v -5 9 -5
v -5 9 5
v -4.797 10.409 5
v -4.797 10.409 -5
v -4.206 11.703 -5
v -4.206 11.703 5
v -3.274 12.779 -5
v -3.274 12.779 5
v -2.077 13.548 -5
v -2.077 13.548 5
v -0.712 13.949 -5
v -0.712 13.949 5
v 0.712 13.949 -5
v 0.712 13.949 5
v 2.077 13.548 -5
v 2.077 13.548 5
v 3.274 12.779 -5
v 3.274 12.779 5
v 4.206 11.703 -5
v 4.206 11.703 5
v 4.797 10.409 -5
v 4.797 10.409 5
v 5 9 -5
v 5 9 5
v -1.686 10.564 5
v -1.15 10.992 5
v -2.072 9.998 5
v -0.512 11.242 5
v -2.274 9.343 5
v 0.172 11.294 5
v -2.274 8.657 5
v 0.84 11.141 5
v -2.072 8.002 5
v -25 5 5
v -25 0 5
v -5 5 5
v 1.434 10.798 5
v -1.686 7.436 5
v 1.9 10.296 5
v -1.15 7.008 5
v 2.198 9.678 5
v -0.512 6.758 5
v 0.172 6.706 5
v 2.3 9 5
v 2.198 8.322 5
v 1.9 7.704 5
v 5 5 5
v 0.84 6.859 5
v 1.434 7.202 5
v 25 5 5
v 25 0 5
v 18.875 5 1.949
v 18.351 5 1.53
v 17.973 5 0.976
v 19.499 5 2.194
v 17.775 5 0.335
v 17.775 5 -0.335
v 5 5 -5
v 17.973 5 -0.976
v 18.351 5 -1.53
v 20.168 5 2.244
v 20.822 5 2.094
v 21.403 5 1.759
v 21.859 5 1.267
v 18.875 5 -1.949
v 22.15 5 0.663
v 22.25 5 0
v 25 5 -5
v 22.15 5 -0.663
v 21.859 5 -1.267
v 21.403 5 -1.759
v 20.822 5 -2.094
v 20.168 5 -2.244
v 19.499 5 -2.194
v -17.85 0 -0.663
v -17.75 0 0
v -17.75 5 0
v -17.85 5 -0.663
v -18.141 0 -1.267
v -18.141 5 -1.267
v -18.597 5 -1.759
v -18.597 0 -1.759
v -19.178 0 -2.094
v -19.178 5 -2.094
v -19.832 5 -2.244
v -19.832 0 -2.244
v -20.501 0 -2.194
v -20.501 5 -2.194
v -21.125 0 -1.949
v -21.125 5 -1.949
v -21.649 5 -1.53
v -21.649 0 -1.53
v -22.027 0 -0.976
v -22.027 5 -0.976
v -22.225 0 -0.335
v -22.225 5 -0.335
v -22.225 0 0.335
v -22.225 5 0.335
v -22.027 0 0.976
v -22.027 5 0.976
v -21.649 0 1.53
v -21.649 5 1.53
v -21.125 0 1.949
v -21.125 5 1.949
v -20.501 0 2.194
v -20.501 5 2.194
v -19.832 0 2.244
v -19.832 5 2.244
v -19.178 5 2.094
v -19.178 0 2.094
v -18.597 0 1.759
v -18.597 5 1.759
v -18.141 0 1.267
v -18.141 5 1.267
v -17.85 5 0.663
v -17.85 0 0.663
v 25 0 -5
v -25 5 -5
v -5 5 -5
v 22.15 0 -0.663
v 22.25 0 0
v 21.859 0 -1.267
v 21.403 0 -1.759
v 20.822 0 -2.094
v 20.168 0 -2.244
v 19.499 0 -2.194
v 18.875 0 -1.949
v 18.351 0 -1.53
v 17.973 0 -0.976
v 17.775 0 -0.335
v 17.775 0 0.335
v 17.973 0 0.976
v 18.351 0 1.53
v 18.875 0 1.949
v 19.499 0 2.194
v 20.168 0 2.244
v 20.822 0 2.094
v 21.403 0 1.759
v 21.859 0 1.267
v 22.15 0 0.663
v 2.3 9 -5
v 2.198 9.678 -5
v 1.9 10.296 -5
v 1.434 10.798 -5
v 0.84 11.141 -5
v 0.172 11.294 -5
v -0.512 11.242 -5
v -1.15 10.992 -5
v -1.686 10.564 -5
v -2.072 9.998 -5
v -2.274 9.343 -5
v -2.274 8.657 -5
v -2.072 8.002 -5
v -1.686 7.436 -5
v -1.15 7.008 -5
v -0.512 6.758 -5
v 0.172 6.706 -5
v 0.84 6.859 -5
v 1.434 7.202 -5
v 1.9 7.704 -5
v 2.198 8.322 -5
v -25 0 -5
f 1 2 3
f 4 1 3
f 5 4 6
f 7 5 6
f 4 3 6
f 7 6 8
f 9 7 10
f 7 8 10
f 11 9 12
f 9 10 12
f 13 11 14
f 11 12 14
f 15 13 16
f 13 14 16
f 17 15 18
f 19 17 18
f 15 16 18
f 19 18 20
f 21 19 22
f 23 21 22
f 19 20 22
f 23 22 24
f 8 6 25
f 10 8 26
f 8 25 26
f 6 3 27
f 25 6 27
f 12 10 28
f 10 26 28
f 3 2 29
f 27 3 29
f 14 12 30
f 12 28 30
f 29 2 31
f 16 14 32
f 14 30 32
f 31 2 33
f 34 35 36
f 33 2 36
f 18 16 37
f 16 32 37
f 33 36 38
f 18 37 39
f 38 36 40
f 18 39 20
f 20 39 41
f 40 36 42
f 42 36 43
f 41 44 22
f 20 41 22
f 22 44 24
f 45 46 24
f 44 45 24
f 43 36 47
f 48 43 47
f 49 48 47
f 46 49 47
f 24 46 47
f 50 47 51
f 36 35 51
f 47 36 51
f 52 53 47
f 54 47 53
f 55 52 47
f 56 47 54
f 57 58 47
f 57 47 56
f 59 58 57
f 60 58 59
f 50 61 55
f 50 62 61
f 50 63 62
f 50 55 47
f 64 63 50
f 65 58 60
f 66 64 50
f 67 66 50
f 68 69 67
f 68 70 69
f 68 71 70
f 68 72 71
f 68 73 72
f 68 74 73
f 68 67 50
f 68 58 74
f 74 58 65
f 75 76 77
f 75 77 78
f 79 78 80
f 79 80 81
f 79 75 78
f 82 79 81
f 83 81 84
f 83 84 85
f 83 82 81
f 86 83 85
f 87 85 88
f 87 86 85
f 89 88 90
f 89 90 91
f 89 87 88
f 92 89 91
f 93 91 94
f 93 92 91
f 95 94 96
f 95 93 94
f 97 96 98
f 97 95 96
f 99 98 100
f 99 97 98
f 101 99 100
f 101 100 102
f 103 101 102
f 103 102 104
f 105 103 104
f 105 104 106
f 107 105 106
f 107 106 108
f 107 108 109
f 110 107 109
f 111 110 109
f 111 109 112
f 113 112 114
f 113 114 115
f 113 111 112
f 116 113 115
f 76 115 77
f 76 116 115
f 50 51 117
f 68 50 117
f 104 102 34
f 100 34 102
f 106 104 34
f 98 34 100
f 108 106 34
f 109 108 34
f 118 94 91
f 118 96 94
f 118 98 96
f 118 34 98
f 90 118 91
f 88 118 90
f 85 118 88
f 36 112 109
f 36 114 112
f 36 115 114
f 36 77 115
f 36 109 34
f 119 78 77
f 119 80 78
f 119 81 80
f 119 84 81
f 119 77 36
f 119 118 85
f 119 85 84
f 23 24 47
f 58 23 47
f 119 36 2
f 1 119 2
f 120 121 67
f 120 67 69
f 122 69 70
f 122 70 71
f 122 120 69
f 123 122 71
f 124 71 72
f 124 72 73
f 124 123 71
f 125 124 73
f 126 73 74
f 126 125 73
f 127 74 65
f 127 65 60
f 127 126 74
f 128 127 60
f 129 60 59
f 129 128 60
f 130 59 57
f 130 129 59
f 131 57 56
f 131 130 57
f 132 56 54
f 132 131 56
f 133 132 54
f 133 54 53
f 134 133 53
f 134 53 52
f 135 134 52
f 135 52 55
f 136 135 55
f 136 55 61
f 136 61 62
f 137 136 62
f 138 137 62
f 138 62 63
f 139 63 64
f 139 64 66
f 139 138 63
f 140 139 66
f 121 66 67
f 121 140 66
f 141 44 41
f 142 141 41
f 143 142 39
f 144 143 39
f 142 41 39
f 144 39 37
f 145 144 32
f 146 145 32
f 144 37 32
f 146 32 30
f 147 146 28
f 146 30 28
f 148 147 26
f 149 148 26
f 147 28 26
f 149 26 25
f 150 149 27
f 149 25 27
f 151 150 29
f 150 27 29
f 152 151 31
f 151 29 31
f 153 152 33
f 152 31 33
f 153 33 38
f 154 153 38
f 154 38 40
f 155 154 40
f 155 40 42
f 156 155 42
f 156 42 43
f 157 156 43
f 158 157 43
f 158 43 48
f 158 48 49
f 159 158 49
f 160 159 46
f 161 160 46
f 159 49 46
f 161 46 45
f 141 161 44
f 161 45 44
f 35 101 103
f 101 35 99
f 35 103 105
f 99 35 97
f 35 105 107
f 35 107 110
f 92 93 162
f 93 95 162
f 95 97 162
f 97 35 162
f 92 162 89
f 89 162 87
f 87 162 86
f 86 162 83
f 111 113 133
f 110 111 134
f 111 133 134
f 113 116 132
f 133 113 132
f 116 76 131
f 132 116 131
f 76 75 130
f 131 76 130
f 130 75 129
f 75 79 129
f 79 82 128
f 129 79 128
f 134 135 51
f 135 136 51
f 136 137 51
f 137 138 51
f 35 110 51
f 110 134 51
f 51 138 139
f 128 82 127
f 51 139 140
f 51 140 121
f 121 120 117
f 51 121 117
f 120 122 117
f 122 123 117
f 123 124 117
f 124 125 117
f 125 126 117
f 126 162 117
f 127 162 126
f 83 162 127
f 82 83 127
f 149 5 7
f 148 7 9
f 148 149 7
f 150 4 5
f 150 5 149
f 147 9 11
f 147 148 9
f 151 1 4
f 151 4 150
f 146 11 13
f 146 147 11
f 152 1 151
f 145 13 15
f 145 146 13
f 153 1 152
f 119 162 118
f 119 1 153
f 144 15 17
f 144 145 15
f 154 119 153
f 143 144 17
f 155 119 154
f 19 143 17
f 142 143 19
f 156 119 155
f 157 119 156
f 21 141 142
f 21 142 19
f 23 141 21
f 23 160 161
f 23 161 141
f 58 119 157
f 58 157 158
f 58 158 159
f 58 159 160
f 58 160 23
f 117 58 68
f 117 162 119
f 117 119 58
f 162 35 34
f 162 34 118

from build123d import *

# Parameters (mm, degrees)
SKETCH1_W           = 50
SKETCH1_H           = 10
SKETCH1_R           = 2.25
BOSS_EXTRUDE1_DEPTH = 5
SKETCH3_R           = 2.3
BOSS_EXTRUDE2_DEPTH = 10


with BuildPart() as part:
    # Sketch1 → Boss-Extrude1 (new body)
    with BuildSketch(Plane(origin=(0, 0, 0), x_dir=(1, 0, 0), z_dir=(0, 1, 0))):
        Rectangle(SKETCH1_W, SKETCH1_H)
        with Locations((-20, 0)):
            Circle(SKETCH1_R, mode=Mode.SUBTRACT)
        with Locations((20, 0)):
            Circle(SKETCH1_R, mode=Mode.SUBTRACT)
    extrude(amount=BOSS_EXTRUDE1_DEPTH)

    # Sketch3 → Boss-Extrude2 (add)
    with BuildSketch(Plane.XY.offset(5)):
        with BuildLine():
            Line((-5, 5), (-5, 9))
            ThreePointArc((-5, 9), (0, 14), (5, 9))
            Line((5, 9), (5, 5))
            Line((5, 5), (-5, 5))
        make_face()
        with Locations((0, 9)):
            Circle(SKETCH3_R, mode=Mode.SUBTRACT)
    extrude(amount=-BOSS_EXTRUDE2_DEPTH)


solid = part.part
